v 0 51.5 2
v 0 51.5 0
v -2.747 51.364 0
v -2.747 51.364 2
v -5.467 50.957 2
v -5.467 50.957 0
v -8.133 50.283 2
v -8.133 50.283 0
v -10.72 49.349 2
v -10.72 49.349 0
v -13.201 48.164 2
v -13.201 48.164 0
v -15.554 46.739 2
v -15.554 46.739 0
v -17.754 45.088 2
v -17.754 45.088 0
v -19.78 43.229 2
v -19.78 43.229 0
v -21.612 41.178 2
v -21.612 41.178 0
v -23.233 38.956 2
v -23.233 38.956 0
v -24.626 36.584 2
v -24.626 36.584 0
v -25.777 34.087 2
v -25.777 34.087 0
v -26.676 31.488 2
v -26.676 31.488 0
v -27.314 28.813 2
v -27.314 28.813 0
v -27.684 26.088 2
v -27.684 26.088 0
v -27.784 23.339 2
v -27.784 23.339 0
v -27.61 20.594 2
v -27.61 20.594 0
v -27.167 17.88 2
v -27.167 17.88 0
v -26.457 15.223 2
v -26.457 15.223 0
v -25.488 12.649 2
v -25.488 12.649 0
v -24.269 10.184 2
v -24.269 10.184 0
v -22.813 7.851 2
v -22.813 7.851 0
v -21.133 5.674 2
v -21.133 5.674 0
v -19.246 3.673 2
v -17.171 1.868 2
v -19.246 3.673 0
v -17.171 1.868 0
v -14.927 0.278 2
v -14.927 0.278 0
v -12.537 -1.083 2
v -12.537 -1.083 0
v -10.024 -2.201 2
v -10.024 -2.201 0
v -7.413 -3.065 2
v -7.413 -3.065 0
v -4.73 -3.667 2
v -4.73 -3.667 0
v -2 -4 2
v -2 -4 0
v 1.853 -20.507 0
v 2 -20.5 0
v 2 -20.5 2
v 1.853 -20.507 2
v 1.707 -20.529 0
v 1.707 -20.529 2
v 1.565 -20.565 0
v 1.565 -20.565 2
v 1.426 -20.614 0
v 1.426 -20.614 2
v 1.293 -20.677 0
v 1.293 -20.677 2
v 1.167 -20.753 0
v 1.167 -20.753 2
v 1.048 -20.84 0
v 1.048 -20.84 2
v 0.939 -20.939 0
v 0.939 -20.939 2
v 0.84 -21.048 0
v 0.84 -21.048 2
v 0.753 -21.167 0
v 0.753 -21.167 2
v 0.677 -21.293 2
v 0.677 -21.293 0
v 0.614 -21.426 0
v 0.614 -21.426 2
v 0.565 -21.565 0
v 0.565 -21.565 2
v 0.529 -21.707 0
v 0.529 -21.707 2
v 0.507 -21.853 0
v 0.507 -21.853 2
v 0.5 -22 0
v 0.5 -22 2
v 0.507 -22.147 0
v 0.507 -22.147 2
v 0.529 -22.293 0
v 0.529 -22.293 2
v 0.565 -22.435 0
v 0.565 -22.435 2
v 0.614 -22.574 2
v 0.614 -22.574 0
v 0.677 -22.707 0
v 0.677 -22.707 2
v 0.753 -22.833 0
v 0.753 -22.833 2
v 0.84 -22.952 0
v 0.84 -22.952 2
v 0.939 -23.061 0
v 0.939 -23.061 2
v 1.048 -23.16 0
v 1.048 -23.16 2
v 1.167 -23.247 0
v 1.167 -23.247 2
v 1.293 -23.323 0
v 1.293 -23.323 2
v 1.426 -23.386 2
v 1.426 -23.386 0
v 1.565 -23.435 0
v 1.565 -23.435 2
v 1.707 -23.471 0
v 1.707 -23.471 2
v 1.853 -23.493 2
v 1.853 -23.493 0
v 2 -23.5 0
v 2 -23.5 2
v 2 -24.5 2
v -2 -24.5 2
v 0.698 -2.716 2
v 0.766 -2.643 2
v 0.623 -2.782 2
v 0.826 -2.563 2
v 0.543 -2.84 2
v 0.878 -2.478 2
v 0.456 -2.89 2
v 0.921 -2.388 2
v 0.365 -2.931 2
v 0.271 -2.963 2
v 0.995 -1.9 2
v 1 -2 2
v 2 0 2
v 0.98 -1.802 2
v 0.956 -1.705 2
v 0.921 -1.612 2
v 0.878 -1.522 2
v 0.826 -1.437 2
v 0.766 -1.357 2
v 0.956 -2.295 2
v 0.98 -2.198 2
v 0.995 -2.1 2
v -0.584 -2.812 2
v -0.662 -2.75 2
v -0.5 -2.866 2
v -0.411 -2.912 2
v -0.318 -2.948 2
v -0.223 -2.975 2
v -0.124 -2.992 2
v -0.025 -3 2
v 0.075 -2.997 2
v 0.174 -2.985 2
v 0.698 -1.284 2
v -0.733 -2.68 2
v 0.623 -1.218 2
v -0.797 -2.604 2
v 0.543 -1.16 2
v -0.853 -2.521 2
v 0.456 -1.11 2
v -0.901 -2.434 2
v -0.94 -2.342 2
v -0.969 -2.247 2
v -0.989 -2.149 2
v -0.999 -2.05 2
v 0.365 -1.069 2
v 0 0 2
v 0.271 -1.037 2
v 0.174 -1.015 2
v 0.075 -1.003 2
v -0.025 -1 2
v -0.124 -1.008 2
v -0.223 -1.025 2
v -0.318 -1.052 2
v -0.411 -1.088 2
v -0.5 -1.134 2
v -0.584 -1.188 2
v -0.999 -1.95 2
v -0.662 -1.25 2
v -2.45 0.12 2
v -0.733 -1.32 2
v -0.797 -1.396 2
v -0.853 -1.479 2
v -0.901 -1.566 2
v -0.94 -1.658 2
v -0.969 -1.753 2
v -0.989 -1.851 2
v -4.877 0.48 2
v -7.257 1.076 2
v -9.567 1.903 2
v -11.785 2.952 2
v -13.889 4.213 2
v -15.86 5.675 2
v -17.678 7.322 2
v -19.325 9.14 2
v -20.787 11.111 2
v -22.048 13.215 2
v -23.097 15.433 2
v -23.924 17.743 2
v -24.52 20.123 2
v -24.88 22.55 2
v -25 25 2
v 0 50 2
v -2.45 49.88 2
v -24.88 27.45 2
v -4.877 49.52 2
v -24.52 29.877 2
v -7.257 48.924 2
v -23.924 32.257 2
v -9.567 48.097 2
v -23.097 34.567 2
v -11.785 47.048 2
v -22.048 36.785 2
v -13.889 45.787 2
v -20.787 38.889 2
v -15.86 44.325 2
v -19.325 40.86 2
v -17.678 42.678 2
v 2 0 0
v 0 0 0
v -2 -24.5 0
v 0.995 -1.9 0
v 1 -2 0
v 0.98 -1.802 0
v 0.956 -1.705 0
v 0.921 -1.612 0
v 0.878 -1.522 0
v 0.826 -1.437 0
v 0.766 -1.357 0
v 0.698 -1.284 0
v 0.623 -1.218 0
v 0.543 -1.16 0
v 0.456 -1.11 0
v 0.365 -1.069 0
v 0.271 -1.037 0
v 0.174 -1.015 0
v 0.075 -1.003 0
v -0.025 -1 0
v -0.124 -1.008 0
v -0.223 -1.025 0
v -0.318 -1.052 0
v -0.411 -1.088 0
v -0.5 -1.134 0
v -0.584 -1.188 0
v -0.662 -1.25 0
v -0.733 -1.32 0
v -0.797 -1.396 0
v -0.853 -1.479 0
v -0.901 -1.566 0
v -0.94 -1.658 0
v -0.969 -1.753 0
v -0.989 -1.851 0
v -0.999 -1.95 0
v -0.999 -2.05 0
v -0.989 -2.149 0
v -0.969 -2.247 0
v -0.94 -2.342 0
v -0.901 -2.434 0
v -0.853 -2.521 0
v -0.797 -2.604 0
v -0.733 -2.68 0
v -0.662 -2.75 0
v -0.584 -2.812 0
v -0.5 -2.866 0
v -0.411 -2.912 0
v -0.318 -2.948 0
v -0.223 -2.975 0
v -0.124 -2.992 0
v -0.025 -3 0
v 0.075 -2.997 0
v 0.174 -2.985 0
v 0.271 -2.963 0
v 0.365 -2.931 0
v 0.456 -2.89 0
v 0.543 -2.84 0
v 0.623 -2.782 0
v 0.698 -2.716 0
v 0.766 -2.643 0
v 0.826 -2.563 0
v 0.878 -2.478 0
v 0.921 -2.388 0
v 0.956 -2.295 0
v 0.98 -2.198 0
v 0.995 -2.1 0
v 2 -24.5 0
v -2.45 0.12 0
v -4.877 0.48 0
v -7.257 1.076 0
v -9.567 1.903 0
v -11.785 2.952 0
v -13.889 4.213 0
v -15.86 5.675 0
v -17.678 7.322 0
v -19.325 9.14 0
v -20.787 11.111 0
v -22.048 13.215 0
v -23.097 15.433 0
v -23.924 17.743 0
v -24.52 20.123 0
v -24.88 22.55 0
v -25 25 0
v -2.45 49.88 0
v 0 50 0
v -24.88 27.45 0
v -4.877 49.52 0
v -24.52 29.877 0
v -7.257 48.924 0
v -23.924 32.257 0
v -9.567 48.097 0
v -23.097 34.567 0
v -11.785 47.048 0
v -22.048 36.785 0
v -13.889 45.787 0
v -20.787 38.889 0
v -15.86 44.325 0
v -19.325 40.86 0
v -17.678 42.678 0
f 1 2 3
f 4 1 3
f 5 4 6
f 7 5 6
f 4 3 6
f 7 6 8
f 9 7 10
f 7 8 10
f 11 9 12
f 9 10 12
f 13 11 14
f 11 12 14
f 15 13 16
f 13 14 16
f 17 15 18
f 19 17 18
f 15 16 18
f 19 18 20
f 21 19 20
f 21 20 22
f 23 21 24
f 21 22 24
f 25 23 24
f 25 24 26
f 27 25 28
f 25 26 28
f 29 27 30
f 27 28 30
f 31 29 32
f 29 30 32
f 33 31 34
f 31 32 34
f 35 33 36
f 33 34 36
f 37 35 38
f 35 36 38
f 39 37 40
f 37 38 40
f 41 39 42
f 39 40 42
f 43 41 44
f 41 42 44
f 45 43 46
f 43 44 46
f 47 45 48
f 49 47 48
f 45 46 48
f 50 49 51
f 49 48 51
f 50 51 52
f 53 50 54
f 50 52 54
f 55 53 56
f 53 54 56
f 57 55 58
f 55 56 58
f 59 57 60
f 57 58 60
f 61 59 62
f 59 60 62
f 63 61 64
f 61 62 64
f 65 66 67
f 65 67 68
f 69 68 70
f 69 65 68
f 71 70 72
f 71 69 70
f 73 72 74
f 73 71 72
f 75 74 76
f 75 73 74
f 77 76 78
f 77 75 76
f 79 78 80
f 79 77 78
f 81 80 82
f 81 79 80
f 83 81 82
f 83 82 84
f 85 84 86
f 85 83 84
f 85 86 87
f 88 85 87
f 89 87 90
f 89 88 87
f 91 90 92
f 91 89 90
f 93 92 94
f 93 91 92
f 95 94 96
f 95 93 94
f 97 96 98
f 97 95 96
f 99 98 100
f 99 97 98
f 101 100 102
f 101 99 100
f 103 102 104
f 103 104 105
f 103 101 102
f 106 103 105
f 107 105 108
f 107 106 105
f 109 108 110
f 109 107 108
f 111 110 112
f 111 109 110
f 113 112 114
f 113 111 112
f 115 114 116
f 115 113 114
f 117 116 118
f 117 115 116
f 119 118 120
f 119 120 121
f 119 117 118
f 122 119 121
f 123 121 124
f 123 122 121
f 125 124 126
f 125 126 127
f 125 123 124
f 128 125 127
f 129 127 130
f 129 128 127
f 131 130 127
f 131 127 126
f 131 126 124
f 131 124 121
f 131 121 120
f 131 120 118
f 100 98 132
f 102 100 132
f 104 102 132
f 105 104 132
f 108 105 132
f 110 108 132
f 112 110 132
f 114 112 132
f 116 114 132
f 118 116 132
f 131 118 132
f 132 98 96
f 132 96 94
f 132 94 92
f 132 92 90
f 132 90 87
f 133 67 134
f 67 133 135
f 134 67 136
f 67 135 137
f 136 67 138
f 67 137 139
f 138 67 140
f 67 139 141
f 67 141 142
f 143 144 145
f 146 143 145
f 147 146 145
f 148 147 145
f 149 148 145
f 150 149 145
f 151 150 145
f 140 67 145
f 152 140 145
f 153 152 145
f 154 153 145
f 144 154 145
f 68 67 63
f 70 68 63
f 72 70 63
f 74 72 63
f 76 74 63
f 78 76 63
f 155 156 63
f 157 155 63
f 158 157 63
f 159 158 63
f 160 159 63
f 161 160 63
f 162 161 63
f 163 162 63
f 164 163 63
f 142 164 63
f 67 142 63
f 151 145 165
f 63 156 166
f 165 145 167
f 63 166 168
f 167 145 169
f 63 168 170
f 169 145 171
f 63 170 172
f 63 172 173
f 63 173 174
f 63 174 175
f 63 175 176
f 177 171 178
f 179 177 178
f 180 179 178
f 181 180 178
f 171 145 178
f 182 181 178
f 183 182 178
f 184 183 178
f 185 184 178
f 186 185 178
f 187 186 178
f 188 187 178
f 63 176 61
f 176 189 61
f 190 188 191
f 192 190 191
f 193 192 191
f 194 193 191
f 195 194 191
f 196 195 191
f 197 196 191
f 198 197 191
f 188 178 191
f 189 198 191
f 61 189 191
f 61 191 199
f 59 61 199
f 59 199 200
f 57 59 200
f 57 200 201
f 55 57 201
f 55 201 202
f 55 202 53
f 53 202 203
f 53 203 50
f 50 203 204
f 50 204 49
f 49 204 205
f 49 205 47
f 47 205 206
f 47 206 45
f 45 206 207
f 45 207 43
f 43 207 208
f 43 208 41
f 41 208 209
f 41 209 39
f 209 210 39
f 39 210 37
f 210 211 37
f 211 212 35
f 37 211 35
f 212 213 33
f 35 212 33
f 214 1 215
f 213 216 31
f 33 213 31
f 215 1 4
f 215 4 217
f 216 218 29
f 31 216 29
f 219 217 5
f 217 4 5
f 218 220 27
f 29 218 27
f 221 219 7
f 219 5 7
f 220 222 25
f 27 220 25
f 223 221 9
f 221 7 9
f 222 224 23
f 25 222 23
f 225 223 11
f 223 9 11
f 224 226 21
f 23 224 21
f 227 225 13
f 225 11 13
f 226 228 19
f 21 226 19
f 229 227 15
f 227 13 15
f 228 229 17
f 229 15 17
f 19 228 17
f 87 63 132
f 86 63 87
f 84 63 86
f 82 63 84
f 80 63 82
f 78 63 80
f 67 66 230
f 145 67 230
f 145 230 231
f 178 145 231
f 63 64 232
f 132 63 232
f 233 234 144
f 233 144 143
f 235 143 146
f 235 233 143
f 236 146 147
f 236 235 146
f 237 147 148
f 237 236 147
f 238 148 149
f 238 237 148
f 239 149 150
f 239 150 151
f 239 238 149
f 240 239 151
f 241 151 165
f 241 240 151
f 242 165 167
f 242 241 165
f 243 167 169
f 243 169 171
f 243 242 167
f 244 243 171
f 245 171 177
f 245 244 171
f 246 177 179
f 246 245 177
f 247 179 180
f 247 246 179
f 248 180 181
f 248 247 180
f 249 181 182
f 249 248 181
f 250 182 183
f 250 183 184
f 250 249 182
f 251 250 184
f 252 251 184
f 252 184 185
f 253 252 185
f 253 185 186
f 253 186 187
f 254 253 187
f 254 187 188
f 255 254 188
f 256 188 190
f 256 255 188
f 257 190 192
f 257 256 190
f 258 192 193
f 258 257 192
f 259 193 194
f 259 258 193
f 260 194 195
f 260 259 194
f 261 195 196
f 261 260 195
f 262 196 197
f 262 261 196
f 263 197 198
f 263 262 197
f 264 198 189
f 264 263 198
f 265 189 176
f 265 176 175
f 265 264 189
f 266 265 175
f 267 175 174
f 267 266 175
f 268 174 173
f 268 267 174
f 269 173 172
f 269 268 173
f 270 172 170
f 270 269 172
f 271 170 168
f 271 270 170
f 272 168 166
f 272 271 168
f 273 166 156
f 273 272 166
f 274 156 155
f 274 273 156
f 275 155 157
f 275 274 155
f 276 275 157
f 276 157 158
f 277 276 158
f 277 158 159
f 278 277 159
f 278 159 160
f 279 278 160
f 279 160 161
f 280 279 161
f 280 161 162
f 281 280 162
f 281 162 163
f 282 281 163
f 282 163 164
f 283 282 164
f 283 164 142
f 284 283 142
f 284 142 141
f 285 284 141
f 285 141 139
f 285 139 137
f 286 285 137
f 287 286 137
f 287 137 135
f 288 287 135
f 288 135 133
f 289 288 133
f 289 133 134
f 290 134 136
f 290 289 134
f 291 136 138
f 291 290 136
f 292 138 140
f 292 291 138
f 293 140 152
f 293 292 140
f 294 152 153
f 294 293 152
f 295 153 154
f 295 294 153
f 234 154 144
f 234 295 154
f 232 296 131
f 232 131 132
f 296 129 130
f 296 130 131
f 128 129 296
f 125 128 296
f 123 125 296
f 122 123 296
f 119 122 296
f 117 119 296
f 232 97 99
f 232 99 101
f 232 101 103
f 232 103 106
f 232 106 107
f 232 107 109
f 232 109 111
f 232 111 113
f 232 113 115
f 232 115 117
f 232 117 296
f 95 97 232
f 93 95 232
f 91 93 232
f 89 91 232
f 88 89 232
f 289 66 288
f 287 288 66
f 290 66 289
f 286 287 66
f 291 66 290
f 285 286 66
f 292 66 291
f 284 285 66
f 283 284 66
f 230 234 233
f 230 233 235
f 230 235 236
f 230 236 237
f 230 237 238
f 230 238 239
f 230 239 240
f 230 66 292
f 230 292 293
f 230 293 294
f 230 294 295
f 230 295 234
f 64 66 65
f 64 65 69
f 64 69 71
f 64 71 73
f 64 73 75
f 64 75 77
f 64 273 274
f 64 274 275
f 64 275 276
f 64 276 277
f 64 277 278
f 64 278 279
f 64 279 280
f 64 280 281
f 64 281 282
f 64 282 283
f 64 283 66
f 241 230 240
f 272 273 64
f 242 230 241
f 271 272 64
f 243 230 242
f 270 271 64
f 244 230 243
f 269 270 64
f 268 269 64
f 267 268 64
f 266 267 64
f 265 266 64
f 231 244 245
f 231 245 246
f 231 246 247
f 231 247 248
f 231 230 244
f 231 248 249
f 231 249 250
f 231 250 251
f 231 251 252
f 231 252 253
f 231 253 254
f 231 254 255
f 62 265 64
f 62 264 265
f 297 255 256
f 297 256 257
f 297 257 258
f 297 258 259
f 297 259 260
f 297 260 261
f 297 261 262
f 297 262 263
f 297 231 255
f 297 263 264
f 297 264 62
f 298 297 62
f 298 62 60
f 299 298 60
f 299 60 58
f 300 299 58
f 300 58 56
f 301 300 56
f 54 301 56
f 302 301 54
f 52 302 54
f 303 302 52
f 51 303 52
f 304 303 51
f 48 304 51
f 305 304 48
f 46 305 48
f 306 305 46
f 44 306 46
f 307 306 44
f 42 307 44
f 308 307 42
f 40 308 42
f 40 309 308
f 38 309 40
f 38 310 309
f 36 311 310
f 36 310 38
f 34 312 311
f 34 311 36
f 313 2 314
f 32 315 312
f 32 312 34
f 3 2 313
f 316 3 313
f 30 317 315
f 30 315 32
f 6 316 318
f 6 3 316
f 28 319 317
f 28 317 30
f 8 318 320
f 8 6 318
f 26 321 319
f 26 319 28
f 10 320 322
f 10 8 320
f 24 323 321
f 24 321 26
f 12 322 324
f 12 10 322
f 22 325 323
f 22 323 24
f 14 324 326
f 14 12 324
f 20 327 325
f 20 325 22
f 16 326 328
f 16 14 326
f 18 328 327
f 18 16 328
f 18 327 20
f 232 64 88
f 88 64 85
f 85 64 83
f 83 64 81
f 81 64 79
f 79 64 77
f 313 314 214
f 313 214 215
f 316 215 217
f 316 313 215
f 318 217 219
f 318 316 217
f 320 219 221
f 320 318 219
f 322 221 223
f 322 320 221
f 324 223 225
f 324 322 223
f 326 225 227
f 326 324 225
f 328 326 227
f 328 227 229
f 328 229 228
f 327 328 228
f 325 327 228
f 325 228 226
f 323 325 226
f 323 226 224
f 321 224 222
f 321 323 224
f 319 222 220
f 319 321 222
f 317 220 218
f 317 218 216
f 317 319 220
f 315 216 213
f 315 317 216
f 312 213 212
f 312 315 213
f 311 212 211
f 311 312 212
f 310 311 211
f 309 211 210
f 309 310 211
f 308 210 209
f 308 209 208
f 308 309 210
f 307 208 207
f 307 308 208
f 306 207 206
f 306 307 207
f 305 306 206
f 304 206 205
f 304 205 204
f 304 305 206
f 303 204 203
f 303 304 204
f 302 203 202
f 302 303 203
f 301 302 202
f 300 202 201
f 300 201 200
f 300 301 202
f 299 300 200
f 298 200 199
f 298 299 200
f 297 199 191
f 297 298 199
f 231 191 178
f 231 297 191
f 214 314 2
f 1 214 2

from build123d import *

# Parameters (mm, degrees)
SKETCH_R  = 1
PAD_DEPTH = 2


with BuildPart() as part:
    # Sketch → Pad (new body)
    with BuildSketch(Plane.XY):
        with BuildLine():
            ThreePointArc((0, 50), (-25, 25), (0, 0))
            Line((2, 0), (0, 0))
            Line((2, -20.5), (2, 0))
            ThreePointArc((2, -20.5), (0.5, -22), (2, -23.5))
            Line((2, -23.5), (2, -24.5))
            Line((2, -24.5), (-2, -24.5))
            Line((-2, -4), (-2, -24.5))
            ThreePointArc((0, 51.5), (-27.768012, 24.714613), (-2, -4))
            Line((0, 50), (0, 51.5))
        make_face()
        with Locations((0, -2)):
            Circle(SKETCH_R, mode=Mode.SUBTRACT)
    extrude(amount=PAD_DEPTH)


solid = part.part
